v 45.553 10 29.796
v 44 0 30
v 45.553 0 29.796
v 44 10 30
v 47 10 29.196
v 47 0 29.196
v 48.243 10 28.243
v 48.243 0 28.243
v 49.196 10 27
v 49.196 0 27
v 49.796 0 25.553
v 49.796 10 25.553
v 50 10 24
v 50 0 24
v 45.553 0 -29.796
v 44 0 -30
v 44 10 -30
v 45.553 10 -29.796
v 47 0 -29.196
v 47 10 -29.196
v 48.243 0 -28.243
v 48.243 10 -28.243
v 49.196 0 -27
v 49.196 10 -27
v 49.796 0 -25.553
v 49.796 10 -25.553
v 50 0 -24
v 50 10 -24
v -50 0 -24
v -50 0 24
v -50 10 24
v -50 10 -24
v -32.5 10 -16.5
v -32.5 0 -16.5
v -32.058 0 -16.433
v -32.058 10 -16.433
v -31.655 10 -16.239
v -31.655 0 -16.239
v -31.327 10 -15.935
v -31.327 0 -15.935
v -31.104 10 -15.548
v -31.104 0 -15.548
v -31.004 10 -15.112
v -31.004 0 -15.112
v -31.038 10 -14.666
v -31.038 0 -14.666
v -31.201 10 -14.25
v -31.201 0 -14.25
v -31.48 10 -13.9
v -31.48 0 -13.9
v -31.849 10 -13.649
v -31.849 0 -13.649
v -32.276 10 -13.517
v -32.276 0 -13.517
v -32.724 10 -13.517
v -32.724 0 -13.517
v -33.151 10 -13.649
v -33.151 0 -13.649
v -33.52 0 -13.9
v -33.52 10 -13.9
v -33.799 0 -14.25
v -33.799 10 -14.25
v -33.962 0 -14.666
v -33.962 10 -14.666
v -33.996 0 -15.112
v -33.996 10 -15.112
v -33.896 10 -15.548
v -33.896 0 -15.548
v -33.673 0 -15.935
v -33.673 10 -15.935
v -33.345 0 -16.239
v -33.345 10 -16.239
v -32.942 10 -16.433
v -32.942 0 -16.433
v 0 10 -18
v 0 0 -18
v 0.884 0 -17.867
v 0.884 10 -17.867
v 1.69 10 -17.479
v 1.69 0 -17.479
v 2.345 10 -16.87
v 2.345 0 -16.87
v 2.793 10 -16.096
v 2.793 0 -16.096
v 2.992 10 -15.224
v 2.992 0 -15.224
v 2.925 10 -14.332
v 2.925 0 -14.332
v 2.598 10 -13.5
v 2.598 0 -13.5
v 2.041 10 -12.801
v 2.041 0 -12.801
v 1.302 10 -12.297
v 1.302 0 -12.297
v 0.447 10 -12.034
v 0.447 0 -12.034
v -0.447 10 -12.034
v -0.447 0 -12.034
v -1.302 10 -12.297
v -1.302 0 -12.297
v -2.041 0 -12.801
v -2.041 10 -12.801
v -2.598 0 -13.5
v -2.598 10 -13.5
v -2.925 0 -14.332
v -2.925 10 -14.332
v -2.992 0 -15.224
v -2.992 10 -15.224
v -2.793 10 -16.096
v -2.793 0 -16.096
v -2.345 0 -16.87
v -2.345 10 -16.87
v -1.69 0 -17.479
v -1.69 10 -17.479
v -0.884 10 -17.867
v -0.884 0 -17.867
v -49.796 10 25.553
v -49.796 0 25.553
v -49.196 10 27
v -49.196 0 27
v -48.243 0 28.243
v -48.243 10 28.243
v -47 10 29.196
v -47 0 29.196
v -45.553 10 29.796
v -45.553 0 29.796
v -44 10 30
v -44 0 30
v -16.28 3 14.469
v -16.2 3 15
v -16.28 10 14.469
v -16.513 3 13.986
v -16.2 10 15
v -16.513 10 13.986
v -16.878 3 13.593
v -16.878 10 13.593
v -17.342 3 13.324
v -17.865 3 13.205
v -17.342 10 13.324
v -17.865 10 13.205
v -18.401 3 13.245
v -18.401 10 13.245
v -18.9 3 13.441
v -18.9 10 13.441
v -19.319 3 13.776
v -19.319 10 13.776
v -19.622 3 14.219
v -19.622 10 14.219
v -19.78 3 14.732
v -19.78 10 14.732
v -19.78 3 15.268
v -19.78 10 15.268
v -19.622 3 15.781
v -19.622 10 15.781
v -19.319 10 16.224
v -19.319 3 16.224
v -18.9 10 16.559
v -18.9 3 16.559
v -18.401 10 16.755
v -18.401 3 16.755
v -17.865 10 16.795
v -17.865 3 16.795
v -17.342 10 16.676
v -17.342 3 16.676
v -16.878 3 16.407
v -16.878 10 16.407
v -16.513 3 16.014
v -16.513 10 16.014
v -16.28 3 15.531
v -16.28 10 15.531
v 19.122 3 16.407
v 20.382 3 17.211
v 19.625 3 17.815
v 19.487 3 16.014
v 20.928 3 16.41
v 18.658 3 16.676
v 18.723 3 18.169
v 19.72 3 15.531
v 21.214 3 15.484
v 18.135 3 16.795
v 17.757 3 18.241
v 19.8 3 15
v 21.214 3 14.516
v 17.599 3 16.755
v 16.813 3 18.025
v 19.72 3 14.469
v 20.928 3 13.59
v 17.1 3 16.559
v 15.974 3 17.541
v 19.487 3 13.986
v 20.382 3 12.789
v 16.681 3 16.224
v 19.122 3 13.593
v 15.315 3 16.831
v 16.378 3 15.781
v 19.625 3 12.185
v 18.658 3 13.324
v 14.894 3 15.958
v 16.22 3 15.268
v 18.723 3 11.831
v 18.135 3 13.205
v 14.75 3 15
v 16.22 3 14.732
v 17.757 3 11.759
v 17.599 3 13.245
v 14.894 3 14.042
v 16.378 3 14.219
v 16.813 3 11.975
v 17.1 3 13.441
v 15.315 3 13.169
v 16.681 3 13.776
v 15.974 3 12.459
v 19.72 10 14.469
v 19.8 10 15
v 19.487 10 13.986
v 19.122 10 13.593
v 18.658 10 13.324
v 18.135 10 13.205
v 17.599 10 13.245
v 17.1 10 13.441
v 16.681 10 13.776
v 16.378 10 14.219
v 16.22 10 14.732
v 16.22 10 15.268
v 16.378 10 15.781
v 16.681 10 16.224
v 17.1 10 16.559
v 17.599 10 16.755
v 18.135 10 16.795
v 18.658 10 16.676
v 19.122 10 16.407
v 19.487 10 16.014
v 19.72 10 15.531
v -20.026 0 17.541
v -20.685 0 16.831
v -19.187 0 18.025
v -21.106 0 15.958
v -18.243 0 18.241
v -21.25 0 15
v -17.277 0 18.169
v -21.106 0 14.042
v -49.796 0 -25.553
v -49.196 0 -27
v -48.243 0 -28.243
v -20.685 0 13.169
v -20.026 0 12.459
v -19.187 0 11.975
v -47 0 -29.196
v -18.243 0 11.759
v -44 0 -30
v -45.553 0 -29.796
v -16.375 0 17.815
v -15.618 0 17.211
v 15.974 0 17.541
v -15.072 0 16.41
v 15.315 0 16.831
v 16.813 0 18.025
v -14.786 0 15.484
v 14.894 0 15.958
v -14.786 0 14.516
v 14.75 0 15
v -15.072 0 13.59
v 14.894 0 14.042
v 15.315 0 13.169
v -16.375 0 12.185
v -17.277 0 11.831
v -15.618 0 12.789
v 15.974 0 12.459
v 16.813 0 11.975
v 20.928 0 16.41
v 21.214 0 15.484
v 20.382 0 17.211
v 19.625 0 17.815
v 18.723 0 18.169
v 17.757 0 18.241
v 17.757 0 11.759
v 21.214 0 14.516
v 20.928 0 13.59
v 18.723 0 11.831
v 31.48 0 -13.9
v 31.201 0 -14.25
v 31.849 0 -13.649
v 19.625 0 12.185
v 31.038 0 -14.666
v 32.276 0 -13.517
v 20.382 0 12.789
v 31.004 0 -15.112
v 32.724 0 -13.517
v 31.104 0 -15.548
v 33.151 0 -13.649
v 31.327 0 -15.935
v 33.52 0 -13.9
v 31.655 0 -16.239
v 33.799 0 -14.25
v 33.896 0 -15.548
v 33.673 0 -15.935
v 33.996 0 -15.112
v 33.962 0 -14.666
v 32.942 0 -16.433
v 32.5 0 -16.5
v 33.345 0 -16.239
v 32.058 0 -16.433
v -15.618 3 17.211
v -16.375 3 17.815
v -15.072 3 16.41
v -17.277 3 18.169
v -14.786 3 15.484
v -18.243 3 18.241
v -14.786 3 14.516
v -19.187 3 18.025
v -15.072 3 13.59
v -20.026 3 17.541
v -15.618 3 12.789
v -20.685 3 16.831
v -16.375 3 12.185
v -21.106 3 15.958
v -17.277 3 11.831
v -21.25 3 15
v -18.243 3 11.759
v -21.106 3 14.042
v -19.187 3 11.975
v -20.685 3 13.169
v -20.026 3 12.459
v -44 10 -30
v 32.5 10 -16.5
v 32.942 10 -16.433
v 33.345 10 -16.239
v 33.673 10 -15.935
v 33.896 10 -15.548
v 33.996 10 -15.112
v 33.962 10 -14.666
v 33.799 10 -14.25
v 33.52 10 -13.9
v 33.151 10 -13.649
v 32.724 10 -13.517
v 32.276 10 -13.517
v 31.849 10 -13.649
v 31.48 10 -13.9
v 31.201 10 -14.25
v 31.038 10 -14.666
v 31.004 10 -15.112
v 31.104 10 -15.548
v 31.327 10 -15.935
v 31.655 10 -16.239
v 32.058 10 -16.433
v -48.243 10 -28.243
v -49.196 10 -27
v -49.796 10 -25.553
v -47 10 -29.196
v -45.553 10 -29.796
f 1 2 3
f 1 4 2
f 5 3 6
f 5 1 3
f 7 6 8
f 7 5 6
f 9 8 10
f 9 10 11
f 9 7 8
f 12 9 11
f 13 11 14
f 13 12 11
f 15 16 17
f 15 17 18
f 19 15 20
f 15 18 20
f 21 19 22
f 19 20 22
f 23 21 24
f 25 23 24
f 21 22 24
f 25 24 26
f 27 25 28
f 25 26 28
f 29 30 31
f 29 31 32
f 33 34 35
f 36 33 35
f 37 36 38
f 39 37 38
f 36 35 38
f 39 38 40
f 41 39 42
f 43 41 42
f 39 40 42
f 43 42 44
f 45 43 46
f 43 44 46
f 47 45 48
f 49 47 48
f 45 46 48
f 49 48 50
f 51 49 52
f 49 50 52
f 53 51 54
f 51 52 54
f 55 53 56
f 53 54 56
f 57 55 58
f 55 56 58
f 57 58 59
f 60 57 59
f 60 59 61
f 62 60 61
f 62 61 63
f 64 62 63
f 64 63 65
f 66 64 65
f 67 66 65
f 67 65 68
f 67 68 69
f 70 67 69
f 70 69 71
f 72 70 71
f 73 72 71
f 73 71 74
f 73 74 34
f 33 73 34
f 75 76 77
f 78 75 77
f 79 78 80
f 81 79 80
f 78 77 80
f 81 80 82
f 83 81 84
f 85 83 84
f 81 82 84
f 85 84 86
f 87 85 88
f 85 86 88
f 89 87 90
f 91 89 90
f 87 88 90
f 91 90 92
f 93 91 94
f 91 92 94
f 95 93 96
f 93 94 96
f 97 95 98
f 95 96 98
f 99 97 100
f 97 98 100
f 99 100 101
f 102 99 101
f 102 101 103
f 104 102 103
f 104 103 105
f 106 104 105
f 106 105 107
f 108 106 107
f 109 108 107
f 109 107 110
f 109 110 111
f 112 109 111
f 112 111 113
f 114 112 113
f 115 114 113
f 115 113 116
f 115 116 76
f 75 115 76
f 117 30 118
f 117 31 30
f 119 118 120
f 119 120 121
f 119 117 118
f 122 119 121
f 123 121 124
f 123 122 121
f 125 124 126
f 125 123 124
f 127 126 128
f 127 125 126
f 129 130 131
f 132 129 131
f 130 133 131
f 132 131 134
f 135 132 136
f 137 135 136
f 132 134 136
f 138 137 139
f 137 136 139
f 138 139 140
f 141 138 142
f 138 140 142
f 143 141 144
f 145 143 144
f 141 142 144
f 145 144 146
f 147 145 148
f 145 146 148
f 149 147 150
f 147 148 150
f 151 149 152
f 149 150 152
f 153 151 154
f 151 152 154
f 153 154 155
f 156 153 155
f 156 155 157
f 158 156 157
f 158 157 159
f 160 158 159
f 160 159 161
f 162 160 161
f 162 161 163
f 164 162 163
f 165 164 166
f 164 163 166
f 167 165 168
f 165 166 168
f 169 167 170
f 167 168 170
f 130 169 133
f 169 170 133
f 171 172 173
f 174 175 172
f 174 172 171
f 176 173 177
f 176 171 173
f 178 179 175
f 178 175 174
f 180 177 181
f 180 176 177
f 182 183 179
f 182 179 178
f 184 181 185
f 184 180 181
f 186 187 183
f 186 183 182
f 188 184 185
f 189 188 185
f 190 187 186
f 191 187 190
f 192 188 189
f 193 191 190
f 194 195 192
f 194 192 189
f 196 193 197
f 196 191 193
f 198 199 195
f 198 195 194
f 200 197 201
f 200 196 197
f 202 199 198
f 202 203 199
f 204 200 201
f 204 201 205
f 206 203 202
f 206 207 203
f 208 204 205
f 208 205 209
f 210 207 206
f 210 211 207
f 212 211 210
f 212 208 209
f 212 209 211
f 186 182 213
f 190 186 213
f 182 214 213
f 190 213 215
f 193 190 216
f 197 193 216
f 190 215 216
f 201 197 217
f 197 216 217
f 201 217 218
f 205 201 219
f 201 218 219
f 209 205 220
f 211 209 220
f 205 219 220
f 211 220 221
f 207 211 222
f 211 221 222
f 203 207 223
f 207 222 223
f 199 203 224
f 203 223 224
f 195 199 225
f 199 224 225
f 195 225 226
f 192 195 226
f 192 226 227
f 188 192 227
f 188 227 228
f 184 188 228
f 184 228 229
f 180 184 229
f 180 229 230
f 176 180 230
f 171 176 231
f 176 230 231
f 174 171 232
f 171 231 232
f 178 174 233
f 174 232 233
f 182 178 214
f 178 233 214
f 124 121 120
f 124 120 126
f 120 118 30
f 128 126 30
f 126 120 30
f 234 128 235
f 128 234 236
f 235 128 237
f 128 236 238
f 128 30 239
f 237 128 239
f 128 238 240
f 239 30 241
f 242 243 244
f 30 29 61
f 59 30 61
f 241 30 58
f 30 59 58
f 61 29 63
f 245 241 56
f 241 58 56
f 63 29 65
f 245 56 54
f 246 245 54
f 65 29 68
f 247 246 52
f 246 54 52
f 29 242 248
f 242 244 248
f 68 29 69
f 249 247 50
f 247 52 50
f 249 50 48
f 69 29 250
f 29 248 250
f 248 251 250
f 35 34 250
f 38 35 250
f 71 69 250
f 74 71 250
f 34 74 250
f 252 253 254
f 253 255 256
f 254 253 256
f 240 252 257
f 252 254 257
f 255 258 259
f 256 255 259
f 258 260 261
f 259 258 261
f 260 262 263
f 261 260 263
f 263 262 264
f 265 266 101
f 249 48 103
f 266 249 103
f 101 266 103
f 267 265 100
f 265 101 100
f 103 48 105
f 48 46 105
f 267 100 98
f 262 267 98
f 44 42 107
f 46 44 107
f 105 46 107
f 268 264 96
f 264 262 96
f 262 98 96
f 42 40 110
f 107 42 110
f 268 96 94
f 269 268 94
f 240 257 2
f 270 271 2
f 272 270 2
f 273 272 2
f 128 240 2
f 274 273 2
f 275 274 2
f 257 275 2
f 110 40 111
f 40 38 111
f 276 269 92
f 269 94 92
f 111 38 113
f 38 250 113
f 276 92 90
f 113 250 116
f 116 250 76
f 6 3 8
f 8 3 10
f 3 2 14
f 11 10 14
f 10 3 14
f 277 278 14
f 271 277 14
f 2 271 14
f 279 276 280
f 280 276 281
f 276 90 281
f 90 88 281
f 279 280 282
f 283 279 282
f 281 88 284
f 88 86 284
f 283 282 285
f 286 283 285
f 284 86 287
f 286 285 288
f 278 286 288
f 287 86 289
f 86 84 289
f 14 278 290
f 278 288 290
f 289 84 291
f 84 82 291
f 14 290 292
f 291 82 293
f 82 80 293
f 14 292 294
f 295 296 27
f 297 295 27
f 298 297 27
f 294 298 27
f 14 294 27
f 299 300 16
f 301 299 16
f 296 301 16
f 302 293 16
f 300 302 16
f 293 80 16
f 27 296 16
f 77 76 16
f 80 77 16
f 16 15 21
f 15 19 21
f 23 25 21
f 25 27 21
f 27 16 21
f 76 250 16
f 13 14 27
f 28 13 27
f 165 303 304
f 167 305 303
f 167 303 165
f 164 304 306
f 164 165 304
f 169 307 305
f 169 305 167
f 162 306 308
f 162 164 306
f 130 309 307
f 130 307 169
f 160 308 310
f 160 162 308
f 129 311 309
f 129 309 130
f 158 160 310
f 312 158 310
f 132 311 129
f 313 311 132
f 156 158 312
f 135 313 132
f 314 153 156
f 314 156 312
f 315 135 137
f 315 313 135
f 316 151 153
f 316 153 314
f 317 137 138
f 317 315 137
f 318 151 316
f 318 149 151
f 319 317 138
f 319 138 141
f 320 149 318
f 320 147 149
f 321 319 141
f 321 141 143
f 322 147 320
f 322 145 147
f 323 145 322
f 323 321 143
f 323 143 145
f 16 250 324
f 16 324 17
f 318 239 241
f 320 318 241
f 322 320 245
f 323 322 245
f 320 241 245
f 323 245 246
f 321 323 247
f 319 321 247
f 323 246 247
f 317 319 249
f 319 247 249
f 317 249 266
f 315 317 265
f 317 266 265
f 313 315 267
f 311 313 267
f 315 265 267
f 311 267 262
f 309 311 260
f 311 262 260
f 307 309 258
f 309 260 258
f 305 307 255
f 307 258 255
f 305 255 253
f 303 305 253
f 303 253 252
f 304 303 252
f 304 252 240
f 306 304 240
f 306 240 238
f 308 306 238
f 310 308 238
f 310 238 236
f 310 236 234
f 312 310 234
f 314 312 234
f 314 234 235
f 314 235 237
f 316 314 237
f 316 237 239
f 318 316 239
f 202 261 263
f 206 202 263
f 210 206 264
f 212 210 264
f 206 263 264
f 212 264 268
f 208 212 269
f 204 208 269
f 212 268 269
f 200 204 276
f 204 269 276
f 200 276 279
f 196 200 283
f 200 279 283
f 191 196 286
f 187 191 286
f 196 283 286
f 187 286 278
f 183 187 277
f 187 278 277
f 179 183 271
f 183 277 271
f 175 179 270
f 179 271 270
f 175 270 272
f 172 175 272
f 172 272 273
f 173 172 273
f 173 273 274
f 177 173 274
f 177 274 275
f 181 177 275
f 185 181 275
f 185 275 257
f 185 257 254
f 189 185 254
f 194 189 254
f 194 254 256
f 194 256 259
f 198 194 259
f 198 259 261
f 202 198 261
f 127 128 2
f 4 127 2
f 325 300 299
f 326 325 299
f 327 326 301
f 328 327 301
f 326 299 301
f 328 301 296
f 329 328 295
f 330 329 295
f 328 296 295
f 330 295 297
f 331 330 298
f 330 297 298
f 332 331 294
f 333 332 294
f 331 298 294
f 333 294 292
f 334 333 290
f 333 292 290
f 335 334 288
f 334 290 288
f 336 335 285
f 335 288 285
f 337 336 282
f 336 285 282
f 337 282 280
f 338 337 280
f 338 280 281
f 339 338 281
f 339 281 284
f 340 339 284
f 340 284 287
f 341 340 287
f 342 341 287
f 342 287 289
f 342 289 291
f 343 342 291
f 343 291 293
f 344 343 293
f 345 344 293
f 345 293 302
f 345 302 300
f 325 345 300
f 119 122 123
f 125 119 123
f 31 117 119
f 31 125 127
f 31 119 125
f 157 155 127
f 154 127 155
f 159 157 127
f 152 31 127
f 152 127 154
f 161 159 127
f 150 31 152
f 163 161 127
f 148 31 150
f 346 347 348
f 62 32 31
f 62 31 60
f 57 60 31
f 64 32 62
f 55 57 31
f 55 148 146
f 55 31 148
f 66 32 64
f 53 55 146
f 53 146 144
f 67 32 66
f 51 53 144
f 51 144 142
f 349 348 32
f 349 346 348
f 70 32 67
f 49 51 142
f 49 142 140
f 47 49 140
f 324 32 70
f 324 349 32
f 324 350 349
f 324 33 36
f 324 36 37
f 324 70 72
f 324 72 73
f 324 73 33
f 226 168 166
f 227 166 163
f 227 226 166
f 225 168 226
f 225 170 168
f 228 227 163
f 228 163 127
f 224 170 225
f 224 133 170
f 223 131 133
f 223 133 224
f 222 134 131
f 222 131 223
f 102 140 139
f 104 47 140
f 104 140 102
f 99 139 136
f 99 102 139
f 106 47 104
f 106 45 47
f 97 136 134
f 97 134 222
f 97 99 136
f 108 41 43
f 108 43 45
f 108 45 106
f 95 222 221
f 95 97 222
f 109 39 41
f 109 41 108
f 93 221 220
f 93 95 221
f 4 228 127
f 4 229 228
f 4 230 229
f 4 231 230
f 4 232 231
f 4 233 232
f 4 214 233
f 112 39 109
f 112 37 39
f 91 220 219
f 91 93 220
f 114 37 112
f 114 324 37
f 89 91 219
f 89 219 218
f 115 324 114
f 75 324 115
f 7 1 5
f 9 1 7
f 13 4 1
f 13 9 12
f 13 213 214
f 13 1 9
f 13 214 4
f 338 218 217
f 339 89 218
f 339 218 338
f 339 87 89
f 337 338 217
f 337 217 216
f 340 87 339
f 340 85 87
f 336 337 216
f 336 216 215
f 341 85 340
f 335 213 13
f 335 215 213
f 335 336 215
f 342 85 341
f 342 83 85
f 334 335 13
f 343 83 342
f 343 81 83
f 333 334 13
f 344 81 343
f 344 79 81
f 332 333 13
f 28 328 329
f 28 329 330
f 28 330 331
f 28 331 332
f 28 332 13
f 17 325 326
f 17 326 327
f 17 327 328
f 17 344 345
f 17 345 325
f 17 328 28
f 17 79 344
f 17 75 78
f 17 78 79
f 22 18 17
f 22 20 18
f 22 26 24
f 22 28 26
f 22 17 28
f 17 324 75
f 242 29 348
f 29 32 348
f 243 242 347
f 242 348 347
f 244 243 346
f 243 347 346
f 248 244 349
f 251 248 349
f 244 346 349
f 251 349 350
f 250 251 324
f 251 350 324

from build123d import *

# Parameters (mm, degrees)
SKETCH1_W                      = 100
SKETCH1_H                      = 60
BOSS_EXTRUDE1_DEPTH            = 10
CBORE_FOR_M3_SHCS1_D           = 3.6
CBORE_FOR_M3_SHCS1_CBORE_D     = 6.5
CBORE_FOR_M3_SHCS1_CBORE_DEPTH = 3
CUT_EXTRUDE1_REACH             = 61.161
SKETCH5_R                      = 3
SKETCH5_R_2                    = 1.5
FILLET1_R                      = 6


with BuildPart() as part:
    # Sketch1 → Boss-Extrude1 (new body)
    with BuildSketch(Plane(origin=(0, 0, 0), x_dir=(1, 0, 0), z_dir=(0, 1, 0))):
        Rectangle(SKETCH1_W, SKETCH1_H)
    extrude(amount=BOSS_EXTRUDE1_DEPTH)

    # CBORE for M3 SHCS1 (through all)
    with Locations(Plane(origin=(0, 0, 0), x_dir=(-1, 0, 0), z_dir=(0, -1, 0))):
        with Locations((-18, -15), (18, -15)):
            CounterBoreHole(CBORE_FOR_M3_SHCS1_D / 2, CBORE_FOR_M3_SHCS1_CBORE_D / 2, CBORE_FOR_M3_SHCS1_CBORE_DEPTH)

    # Sketch5 → Cut-Extrude1 (cut, up to next)
    with BuildSketch(Plane(origin=(0, 0, 0), x_dir=(-1, 0, 0), z_dir=(0, -1, 0)), mode=Mode.PRIVATE) as cut_extrude1_sk1:
        with Locations(Location((0, 15, 0), (0, 0, 90))):
            Circle(SKETCH5_R)
    cut_extrude1_tool1 = extrude(cut_extrude1_sk1.sketch, amount=-CUT_EXTRUDE1_REACH, mode=Mode.PRIVATE) & part.part
    # Sketch5 → Cut-Extrude1 (cut, up to next)
    with BuildSketch(Plane(origin=(0, 0, 0), x_dir=(-1, 0, 0), z_dir=(0, -1, 0)), mode=Mode.PRIVATE) as cut_extrude1_sk2:
        with Locations(Location((32.5, 15, 0), (0, 0, 90))):
            Circle(SKETCH5_R_2)
    cut_extrude1_tool2 = extrude(cut_extrude1_sk2.sketch, amount=-CUT_EXTRUDE1_REACH, mode=Mode.PRIVATE) & part.part
    # Sketch5 → Cut-Extrude1 (cut, up to next)
    with BuildSketch(Plane(origin=(0, 0, 0), x_dir=(-1, 0, 0), z_dir=(0, -1, 0)), mode=Mode.PRIVATE) as cut_extrude1_sk3:
        with Locations(Location((-32.5, 15, 0), (0, 0, 90))):
            Circle(SKETCH5_R_2)
    cut_extrude1_tool3 = extrude(cut_extrude1_sk3.sketch, amount=-CUT_EXTRUDE1_REACH, mode=Mode.PRIVATE) & part.part
    add(cut_extrude1_tool1.solids().sort_by_distance((0, 0, -15))[0], mode=Mode.SUBTRACT)
    add(cut_extrude1_tool2.solids().sort_by_distance((-32.5, 0, -15))[0], mode=Mode.SUBTRACT)
    add(cut_extrude1_tool3.solids().sort_by_distance((32.5, 0, -15))[0], mode=Mode.SUBTRACT)

    # Fillet1
    fillet1_edges = [part.edges().sort_by_distance(p)[0] for p in [
        (50, 5, 30),
        (-50, 5, 30),
        (-50, 5, -30),
        (50, 5, -30),
    ]]
    fillet(fillet1_edges, radius=FILLET1_R)


solid = part.part
